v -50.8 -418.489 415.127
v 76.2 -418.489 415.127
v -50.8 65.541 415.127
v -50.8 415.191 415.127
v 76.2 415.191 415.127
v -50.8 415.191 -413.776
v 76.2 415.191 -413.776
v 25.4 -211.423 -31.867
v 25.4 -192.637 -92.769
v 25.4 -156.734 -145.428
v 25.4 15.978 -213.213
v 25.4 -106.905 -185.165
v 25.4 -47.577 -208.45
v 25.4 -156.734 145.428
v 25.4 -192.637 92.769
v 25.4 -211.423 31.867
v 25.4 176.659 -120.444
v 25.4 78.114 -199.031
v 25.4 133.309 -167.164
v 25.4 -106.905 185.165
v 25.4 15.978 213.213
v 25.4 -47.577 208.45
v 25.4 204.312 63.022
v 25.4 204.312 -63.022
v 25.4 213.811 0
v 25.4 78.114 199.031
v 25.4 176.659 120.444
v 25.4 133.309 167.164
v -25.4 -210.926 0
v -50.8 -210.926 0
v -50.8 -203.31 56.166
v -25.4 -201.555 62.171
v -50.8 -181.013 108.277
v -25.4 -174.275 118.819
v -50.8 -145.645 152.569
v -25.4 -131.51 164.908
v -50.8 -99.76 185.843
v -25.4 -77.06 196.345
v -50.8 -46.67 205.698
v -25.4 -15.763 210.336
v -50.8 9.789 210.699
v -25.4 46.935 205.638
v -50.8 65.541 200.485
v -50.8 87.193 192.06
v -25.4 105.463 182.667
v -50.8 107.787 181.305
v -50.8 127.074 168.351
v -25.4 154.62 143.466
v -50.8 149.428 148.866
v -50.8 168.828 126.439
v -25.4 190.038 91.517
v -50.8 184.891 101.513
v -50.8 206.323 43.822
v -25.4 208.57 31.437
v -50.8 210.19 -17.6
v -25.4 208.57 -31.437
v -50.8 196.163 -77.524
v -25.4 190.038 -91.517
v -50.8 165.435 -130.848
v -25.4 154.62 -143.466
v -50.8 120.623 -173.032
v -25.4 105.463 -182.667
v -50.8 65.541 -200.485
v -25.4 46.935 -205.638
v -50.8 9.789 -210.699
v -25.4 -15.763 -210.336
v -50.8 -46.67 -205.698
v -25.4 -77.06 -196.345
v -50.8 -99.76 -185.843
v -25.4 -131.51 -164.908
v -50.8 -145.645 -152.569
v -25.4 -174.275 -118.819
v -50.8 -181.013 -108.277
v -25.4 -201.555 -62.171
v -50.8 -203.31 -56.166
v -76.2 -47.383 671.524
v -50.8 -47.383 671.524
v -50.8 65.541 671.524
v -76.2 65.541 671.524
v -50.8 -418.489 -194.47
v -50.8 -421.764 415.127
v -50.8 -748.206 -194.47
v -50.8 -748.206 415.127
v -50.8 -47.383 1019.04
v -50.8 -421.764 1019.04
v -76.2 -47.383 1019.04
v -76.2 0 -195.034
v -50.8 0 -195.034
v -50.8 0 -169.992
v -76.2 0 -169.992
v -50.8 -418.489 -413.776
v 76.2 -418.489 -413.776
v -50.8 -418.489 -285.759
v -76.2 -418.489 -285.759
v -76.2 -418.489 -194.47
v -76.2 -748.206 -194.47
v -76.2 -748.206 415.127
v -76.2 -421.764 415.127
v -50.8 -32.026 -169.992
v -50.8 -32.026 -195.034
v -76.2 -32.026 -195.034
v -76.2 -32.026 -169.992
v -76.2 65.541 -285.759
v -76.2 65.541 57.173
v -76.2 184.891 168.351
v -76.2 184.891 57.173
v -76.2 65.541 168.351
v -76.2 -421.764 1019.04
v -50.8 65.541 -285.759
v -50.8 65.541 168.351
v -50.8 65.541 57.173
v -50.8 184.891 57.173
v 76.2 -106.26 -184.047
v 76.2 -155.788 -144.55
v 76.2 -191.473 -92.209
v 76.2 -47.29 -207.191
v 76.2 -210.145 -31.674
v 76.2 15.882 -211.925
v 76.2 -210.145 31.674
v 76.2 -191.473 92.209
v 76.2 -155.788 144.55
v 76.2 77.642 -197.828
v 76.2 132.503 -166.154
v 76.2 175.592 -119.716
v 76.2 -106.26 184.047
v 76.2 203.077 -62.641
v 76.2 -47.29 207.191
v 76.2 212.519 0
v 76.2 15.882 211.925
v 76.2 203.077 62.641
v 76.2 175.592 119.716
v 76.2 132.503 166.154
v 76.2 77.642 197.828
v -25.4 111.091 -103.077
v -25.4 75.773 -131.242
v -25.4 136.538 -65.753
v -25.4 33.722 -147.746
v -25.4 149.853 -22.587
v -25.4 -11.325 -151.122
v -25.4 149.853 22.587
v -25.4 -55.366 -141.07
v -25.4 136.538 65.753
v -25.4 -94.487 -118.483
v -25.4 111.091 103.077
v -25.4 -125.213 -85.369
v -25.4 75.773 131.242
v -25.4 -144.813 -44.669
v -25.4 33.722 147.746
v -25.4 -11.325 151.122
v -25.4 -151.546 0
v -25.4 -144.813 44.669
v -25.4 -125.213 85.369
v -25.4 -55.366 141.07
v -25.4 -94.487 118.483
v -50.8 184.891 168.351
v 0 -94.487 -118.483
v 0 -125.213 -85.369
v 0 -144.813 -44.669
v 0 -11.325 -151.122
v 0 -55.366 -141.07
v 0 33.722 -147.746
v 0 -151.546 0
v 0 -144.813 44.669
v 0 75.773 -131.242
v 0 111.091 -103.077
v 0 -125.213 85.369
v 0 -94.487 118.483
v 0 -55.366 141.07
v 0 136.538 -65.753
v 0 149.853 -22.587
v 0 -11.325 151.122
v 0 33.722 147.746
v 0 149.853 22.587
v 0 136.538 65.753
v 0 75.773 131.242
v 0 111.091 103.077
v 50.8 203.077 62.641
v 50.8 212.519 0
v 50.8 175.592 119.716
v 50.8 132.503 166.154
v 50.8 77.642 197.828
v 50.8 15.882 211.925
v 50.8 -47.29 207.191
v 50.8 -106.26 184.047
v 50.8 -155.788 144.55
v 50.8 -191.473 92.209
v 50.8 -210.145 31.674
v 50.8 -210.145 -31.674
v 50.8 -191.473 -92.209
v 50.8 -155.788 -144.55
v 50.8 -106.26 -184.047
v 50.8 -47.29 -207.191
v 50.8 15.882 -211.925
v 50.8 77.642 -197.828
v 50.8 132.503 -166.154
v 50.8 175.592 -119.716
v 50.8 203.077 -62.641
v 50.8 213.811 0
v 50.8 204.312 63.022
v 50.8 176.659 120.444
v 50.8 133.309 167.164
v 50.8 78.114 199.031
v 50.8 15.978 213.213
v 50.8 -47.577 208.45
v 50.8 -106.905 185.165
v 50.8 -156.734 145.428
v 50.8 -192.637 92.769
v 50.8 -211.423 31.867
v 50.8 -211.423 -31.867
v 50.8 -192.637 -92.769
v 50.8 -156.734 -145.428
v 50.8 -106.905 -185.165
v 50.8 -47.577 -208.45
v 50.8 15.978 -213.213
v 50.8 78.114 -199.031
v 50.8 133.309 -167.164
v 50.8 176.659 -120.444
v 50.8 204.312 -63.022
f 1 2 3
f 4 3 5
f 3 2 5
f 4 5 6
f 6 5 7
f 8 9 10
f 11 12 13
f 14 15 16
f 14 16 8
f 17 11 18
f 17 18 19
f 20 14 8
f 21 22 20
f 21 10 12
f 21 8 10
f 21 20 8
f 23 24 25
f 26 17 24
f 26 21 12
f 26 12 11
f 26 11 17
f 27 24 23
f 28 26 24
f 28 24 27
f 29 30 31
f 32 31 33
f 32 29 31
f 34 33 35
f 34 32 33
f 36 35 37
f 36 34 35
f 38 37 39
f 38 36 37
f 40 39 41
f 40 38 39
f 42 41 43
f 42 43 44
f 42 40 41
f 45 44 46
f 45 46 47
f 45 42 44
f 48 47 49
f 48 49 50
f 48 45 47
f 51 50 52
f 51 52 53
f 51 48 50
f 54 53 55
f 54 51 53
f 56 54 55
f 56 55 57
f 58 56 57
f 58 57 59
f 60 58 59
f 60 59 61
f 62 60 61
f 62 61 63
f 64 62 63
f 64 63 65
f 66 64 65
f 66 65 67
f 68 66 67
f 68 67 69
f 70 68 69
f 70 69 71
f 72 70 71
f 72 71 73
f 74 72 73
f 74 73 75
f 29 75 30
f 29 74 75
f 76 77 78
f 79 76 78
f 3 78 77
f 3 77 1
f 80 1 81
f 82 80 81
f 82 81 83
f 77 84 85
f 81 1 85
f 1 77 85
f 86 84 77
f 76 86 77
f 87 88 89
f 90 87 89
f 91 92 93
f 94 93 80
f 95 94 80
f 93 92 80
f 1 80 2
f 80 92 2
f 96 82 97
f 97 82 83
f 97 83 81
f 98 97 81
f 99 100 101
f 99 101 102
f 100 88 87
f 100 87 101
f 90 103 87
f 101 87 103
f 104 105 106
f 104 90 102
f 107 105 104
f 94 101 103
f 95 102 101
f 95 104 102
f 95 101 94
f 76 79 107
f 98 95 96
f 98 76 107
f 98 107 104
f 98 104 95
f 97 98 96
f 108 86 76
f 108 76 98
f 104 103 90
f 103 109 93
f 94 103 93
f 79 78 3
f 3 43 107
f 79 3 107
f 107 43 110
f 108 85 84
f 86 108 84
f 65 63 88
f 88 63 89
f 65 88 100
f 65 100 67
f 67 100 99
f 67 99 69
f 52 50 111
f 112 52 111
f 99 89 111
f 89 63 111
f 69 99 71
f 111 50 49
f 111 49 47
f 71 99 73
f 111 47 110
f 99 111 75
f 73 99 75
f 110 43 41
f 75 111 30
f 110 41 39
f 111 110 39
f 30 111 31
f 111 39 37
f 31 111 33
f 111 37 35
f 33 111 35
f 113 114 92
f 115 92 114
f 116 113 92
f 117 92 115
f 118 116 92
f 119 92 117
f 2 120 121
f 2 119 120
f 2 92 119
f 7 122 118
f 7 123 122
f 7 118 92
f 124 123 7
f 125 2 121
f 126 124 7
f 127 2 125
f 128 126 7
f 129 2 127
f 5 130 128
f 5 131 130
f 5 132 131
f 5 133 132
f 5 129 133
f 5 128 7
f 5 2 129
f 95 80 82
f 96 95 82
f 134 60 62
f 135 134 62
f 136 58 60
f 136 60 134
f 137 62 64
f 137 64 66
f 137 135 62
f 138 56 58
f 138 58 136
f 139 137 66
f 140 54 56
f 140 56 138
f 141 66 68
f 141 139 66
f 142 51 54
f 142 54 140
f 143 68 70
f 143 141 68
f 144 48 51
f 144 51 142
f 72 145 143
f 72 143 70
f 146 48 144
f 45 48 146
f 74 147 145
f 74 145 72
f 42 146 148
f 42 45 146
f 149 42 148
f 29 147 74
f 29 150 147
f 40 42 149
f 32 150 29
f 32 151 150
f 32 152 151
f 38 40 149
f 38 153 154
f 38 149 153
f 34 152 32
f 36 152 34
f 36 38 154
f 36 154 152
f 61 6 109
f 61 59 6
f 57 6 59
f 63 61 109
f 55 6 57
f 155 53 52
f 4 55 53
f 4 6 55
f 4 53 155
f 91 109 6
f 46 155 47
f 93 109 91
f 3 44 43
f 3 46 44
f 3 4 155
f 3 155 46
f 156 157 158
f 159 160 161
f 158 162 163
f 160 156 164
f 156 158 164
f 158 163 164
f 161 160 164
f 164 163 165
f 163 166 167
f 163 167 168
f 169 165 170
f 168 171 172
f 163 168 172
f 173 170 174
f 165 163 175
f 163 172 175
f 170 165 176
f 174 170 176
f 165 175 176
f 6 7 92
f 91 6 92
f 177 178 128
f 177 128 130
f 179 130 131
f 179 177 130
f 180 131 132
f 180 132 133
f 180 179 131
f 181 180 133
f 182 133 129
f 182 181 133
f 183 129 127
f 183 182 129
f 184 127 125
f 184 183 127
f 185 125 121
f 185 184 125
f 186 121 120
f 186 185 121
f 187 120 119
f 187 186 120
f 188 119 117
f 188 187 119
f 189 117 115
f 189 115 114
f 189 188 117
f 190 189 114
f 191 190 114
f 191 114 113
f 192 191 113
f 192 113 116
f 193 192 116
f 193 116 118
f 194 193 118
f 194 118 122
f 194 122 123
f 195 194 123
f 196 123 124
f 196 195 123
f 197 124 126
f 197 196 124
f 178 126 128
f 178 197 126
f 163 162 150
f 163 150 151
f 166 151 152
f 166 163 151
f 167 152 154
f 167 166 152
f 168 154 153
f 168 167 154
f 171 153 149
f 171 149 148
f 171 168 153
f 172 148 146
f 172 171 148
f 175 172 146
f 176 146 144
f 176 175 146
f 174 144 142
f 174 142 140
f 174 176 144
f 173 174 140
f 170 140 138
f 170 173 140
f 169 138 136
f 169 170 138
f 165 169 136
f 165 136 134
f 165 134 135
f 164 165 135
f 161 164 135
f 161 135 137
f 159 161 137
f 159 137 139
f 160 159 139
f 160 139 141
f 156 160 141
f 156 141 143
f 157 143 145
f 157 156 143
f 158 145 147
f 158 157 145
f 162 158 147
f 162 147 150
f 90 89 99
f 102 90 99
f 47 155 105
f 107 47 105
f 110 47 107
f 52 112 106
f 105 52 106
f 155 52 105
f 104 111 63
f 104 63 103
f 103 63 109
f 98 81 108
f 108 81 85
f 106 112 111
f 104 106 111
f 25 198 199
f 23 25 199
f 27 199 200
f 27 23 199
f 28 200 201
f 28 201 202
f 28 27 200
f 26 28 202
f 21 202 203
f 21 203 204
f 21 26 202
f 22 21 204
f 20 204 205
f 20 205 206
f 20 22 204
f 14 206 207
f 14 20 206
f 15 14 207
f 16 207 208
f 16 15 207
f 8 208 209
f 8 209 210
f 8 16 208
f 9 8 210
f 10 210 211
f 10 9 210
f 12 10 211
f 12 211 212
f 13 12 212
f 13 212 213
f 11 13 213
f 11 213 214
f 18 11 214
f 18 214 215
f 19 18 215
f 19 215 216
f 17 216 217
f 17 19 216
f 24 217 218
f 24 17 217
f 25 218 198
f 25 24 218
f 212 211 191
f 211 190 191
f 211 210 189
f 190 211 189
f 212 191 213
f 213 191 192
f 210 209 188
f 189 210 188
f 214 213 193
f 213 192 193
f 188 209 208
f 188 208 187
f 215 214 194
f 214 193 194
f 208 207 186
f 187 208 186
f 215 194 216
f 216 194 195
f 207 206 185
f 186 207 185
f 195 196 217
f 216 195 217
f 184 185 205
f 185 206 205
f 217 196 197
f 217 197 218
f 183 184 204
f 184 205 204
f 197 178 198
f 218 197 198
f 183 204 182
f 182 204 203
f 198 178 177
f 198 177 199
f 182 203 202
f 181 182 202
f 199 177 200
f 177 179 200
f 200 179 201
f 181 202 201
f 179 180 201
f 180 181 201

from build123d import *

# Parameters (mm, degrees)
F0_W      = 227.177798748
F0_H      = 67.4825310707
F0_W_2    = 7.6686143875
F0_W_3    = 40.7849550247
F0_H_2    = 19.1998630762
F1_DEPTH  = 25.4
F2_W      = 713.7889862061
F2_H      = 722.4479019642
F3_DEPTH  = 10751.3055801392
F5_W      = 833.6800336838
F5_H      = 828.9024829865
F6_DEPTH  = 25.4
F7_W      = 833.6800336838
F7_H      = 828.9024829865
F7_R      = 213.8106585198
F8_DEPTH  = 25.4
F9_W      = 805.6761920452
F9_H      = 828.9024829865
F9_R      = 212.5191058953
F9_W_2    = 28.0038416386
F10_DEPTH = 25.4
F11_W     = 833.6800336838
F11_H     = 828.9024829865
F11_R     = 151.5456161356
F12_DEPTH = 25.4
F13_W     = 680.4287135601
F13_H     = 667.77536273
F13_R     = 210.9258695705
F14_DEPTH = 25.4
F15_W     = 153.2513201237
F15_H     = 667.77536273
F16_DEPTH = 25.4
F17_W     = 371.1061030626
F17_H     = 256.3967704773
F17_W_2   = 32.0261418819
F17_H_2   = 25.0417590141
F17_W_3   = 119.3500384688
F17_H_3   = 111.177533865
F18_DEPTH = 25.4


with BuildPart() as f1:
    # F0 (on Right) → F1 (new body)
    with BuildSketch(Plane.YZ):
        Polygon((-598.1872081757, 183.7075799704), (-598.1872081757, 196.1238980293), (-605.8558225632, 196.1238980293), (-605.8558225632, 145.6781327724), (-598.1872081757, 145.6781327724), align=None)
        Polygon((-605.8558225632, 196.1238980293), (-598.1872081757, 196.1238980293), (-598.1872081757, 401.8925428391), (-605.8558225632, 401.8925428391), (-605.8558225632, 215.3237611055), align=None)
        Polygon((-1197.3617076874, 196.1238980293), (-605.8558225632, 196.1238980293), (-605.8558225632, 215.3237611055), (-1548.1258630753, 215.3237611055), (-1548.1258630753, 196.1238980293), align=None)
        Polygon((698.481798172, 183.7075799704), (-598.1872081757, 183.7075799704), (-598.1872081757, 145.6781327724), (-598.1872081757, 78.1956017017), (-598.1872081757, 8.7382793427), (698.481798172, 8.7382793427), align=None)
        Polygon((-1197.3617076874, 145.6781327724), (-1197.3617076874, 196.1238980293), (-1548.1258630753, 196.1238980293), (-1548.1258630753, 78.1956017017), (-833.0336213112, 78.1956017017), (-833.0336213112, 145.6781327724), align=None)
        with Locations((-719.4447219372, 111.9368672371)):
            Rectangle(F0_W, F0_H)
        with Locations((-602.0215153694, 111.9368672371)):
            Rectangle(F0_W_2, F0_H)
        Polygon((-1548.1258630753, 215.3237611055), (-605.8558225632, 215.3237611055), (-605.8558225632, 401.8925428391), (-1588.9108181, 401.8925428391), (-1588.9108181, 215.3237611055), align=None)
        with Locations((-1568.5183405876, 205.7238295674)):
            Rectangle(F0_W_3, F0_H_2)
    extrude(amount=F1_DEPTH)

    # F2 (on face) → F3 (join)
    with BuildSketch(Plane(origin=(0, 0, 0), x_dir=(0, -1, 0), z_dir=(-1, 0, 0))):
        with Locations((448.7802386284, 201.1957615614)):
            Rectangle(F2_W, F2_H)
    extrude(amount=F3_DEPTH)


with BuildPart() as f6:
    # F5 (on Right) → F6 (new body)
    with BuildSketch(Plane.YZ):
        with Locations((-1.6488134861, 0.6756186485)):
            Rectangle(F5_W, F5_H)
    extrude(amount=F6_DEPTH)

    # F7 (on face) → F8 (join)
    with BuildSketch(Plane.YZ.offset(25.4)):
        with Locations((-1.6488134861, 0.6756186485)):
            Rectangle(F7_W, F7_H)
        Circle(F7_R, mode=Mode.SUBTRACT)
    extrude(amount=F8_DEPTH)

    # F9 (on face) → F10 (join)
    with BuildSketch(Plane.YZ.offset(50.8)):
        with Locations((-15.6507343054, 0.6756186485)):
            Rectangle(F9_W, F9_H)
        Circle(F9_R, mode=Mode.SUBTRACT)
        with Locations((401.1892825365, 0.6756186485)):
            Rectangle(F9_W_2, F9_H)
    extrude(amount=F10_DEPTH)

    # F11 (on face) → F12 (join)
    with BuildSketch(Plane(origin=(0, 0, 0), x_dir=(0, -1, 0), z_dir=(-1, 0, 0))):
        with Locations((1.6488134861, 0.6756186485)):
            Rectangle(F11_W, F11_H)
        Circle(F11_R, mode=Mode.SUBTRACT)
    extrude(amount=F12_DEPTH)

    # F13 (on face) → F14 (join)
    with BuildSketch(Plane(origin=(-25.4, 0, 0), x_dir=(0, -1, 0), z_dir=(-1, 0, 0))):
        with Locations((-74.9768465757, -79.8879414797)):
            Rectangle(F13_W, F13_H)
        Circle(F13_R, mode=Mode.SUBTRACT)
    extrude(amount=F14_DEPTH)

    # F15 (on face) → F16 (join)
    with BuildSketch(Plane(origin=(-25.4, 0, 0), x_dir=(0, -1, 0), z_dir=(-1, 0, 0))):
        Polygon((418.488830328, 415.1268601418), (-415.1912033558, 415.1268601418), (-415.1912033558, 253.9997398853), (265.2375102043, 253.9997398853), (418.488830328, 253.9997398853), align=None)
        with Locations((341.8631702662, -79.8879414797)):
            Rectangle(F15_W, F15_H)
    extrude(amount=F16_DEPTH)

    # F17 (on face) → F18 (join)
    with BuildSketch(Plane(origin=(-50.8, 0, 0), x_dir=(0, -1, 0), z_dir=(-1, 0, 0))):
        with Locations((232.9357787967, 543.3252453804)):
            Rectangle(F17_W, F17_H)
        Polygon((418.488830328, 415.1268601418), (47.3827272654, 415.1268601418), (47.3827272654, 671.523630619), (-65.5413940549, 671.523630619), (-65.5413940549, 168.3508753777), (-65.5413940549, 57.1733415127), (-65.5413940549, -285.7585549355), (418.488830328, -285.7585549355), (418.488830328, -220.9893465042), (418.488830328, -194.4699287415), (418.488830328, 0.6756186485), align=None)
        with Locations((16.013070941, -182.512909174)):
            Rectangle(F17_W_2, F17_H_2, mode=Mode.SUBTRACT)
        Polygon((418.488830328, 671.523630619), (418.488830328, 415.1268601418), (421.7643141747, 415.1268601418), (421.7643141747, 1019.0404653549), (47.3827272654, 1019.0404653549), (47.3827272654, 671.523630619), align=None)
        Polygon((421.7643141747, 415.1268601418), (418.488830328, 415.1268601418), (418.488830328, 0.6756186485), (418.488830328, -194.4699287415), (748.2059001923, -194.4699287415), (748.2059001923, 415.1268601418), align=None)
        with Locations((-125.2164132893, 112.7621084452)):
            Rectangle(F17_W_3, F17_H_3)
    extrude(amount=F18_DEPTH)


solid = f6.part
